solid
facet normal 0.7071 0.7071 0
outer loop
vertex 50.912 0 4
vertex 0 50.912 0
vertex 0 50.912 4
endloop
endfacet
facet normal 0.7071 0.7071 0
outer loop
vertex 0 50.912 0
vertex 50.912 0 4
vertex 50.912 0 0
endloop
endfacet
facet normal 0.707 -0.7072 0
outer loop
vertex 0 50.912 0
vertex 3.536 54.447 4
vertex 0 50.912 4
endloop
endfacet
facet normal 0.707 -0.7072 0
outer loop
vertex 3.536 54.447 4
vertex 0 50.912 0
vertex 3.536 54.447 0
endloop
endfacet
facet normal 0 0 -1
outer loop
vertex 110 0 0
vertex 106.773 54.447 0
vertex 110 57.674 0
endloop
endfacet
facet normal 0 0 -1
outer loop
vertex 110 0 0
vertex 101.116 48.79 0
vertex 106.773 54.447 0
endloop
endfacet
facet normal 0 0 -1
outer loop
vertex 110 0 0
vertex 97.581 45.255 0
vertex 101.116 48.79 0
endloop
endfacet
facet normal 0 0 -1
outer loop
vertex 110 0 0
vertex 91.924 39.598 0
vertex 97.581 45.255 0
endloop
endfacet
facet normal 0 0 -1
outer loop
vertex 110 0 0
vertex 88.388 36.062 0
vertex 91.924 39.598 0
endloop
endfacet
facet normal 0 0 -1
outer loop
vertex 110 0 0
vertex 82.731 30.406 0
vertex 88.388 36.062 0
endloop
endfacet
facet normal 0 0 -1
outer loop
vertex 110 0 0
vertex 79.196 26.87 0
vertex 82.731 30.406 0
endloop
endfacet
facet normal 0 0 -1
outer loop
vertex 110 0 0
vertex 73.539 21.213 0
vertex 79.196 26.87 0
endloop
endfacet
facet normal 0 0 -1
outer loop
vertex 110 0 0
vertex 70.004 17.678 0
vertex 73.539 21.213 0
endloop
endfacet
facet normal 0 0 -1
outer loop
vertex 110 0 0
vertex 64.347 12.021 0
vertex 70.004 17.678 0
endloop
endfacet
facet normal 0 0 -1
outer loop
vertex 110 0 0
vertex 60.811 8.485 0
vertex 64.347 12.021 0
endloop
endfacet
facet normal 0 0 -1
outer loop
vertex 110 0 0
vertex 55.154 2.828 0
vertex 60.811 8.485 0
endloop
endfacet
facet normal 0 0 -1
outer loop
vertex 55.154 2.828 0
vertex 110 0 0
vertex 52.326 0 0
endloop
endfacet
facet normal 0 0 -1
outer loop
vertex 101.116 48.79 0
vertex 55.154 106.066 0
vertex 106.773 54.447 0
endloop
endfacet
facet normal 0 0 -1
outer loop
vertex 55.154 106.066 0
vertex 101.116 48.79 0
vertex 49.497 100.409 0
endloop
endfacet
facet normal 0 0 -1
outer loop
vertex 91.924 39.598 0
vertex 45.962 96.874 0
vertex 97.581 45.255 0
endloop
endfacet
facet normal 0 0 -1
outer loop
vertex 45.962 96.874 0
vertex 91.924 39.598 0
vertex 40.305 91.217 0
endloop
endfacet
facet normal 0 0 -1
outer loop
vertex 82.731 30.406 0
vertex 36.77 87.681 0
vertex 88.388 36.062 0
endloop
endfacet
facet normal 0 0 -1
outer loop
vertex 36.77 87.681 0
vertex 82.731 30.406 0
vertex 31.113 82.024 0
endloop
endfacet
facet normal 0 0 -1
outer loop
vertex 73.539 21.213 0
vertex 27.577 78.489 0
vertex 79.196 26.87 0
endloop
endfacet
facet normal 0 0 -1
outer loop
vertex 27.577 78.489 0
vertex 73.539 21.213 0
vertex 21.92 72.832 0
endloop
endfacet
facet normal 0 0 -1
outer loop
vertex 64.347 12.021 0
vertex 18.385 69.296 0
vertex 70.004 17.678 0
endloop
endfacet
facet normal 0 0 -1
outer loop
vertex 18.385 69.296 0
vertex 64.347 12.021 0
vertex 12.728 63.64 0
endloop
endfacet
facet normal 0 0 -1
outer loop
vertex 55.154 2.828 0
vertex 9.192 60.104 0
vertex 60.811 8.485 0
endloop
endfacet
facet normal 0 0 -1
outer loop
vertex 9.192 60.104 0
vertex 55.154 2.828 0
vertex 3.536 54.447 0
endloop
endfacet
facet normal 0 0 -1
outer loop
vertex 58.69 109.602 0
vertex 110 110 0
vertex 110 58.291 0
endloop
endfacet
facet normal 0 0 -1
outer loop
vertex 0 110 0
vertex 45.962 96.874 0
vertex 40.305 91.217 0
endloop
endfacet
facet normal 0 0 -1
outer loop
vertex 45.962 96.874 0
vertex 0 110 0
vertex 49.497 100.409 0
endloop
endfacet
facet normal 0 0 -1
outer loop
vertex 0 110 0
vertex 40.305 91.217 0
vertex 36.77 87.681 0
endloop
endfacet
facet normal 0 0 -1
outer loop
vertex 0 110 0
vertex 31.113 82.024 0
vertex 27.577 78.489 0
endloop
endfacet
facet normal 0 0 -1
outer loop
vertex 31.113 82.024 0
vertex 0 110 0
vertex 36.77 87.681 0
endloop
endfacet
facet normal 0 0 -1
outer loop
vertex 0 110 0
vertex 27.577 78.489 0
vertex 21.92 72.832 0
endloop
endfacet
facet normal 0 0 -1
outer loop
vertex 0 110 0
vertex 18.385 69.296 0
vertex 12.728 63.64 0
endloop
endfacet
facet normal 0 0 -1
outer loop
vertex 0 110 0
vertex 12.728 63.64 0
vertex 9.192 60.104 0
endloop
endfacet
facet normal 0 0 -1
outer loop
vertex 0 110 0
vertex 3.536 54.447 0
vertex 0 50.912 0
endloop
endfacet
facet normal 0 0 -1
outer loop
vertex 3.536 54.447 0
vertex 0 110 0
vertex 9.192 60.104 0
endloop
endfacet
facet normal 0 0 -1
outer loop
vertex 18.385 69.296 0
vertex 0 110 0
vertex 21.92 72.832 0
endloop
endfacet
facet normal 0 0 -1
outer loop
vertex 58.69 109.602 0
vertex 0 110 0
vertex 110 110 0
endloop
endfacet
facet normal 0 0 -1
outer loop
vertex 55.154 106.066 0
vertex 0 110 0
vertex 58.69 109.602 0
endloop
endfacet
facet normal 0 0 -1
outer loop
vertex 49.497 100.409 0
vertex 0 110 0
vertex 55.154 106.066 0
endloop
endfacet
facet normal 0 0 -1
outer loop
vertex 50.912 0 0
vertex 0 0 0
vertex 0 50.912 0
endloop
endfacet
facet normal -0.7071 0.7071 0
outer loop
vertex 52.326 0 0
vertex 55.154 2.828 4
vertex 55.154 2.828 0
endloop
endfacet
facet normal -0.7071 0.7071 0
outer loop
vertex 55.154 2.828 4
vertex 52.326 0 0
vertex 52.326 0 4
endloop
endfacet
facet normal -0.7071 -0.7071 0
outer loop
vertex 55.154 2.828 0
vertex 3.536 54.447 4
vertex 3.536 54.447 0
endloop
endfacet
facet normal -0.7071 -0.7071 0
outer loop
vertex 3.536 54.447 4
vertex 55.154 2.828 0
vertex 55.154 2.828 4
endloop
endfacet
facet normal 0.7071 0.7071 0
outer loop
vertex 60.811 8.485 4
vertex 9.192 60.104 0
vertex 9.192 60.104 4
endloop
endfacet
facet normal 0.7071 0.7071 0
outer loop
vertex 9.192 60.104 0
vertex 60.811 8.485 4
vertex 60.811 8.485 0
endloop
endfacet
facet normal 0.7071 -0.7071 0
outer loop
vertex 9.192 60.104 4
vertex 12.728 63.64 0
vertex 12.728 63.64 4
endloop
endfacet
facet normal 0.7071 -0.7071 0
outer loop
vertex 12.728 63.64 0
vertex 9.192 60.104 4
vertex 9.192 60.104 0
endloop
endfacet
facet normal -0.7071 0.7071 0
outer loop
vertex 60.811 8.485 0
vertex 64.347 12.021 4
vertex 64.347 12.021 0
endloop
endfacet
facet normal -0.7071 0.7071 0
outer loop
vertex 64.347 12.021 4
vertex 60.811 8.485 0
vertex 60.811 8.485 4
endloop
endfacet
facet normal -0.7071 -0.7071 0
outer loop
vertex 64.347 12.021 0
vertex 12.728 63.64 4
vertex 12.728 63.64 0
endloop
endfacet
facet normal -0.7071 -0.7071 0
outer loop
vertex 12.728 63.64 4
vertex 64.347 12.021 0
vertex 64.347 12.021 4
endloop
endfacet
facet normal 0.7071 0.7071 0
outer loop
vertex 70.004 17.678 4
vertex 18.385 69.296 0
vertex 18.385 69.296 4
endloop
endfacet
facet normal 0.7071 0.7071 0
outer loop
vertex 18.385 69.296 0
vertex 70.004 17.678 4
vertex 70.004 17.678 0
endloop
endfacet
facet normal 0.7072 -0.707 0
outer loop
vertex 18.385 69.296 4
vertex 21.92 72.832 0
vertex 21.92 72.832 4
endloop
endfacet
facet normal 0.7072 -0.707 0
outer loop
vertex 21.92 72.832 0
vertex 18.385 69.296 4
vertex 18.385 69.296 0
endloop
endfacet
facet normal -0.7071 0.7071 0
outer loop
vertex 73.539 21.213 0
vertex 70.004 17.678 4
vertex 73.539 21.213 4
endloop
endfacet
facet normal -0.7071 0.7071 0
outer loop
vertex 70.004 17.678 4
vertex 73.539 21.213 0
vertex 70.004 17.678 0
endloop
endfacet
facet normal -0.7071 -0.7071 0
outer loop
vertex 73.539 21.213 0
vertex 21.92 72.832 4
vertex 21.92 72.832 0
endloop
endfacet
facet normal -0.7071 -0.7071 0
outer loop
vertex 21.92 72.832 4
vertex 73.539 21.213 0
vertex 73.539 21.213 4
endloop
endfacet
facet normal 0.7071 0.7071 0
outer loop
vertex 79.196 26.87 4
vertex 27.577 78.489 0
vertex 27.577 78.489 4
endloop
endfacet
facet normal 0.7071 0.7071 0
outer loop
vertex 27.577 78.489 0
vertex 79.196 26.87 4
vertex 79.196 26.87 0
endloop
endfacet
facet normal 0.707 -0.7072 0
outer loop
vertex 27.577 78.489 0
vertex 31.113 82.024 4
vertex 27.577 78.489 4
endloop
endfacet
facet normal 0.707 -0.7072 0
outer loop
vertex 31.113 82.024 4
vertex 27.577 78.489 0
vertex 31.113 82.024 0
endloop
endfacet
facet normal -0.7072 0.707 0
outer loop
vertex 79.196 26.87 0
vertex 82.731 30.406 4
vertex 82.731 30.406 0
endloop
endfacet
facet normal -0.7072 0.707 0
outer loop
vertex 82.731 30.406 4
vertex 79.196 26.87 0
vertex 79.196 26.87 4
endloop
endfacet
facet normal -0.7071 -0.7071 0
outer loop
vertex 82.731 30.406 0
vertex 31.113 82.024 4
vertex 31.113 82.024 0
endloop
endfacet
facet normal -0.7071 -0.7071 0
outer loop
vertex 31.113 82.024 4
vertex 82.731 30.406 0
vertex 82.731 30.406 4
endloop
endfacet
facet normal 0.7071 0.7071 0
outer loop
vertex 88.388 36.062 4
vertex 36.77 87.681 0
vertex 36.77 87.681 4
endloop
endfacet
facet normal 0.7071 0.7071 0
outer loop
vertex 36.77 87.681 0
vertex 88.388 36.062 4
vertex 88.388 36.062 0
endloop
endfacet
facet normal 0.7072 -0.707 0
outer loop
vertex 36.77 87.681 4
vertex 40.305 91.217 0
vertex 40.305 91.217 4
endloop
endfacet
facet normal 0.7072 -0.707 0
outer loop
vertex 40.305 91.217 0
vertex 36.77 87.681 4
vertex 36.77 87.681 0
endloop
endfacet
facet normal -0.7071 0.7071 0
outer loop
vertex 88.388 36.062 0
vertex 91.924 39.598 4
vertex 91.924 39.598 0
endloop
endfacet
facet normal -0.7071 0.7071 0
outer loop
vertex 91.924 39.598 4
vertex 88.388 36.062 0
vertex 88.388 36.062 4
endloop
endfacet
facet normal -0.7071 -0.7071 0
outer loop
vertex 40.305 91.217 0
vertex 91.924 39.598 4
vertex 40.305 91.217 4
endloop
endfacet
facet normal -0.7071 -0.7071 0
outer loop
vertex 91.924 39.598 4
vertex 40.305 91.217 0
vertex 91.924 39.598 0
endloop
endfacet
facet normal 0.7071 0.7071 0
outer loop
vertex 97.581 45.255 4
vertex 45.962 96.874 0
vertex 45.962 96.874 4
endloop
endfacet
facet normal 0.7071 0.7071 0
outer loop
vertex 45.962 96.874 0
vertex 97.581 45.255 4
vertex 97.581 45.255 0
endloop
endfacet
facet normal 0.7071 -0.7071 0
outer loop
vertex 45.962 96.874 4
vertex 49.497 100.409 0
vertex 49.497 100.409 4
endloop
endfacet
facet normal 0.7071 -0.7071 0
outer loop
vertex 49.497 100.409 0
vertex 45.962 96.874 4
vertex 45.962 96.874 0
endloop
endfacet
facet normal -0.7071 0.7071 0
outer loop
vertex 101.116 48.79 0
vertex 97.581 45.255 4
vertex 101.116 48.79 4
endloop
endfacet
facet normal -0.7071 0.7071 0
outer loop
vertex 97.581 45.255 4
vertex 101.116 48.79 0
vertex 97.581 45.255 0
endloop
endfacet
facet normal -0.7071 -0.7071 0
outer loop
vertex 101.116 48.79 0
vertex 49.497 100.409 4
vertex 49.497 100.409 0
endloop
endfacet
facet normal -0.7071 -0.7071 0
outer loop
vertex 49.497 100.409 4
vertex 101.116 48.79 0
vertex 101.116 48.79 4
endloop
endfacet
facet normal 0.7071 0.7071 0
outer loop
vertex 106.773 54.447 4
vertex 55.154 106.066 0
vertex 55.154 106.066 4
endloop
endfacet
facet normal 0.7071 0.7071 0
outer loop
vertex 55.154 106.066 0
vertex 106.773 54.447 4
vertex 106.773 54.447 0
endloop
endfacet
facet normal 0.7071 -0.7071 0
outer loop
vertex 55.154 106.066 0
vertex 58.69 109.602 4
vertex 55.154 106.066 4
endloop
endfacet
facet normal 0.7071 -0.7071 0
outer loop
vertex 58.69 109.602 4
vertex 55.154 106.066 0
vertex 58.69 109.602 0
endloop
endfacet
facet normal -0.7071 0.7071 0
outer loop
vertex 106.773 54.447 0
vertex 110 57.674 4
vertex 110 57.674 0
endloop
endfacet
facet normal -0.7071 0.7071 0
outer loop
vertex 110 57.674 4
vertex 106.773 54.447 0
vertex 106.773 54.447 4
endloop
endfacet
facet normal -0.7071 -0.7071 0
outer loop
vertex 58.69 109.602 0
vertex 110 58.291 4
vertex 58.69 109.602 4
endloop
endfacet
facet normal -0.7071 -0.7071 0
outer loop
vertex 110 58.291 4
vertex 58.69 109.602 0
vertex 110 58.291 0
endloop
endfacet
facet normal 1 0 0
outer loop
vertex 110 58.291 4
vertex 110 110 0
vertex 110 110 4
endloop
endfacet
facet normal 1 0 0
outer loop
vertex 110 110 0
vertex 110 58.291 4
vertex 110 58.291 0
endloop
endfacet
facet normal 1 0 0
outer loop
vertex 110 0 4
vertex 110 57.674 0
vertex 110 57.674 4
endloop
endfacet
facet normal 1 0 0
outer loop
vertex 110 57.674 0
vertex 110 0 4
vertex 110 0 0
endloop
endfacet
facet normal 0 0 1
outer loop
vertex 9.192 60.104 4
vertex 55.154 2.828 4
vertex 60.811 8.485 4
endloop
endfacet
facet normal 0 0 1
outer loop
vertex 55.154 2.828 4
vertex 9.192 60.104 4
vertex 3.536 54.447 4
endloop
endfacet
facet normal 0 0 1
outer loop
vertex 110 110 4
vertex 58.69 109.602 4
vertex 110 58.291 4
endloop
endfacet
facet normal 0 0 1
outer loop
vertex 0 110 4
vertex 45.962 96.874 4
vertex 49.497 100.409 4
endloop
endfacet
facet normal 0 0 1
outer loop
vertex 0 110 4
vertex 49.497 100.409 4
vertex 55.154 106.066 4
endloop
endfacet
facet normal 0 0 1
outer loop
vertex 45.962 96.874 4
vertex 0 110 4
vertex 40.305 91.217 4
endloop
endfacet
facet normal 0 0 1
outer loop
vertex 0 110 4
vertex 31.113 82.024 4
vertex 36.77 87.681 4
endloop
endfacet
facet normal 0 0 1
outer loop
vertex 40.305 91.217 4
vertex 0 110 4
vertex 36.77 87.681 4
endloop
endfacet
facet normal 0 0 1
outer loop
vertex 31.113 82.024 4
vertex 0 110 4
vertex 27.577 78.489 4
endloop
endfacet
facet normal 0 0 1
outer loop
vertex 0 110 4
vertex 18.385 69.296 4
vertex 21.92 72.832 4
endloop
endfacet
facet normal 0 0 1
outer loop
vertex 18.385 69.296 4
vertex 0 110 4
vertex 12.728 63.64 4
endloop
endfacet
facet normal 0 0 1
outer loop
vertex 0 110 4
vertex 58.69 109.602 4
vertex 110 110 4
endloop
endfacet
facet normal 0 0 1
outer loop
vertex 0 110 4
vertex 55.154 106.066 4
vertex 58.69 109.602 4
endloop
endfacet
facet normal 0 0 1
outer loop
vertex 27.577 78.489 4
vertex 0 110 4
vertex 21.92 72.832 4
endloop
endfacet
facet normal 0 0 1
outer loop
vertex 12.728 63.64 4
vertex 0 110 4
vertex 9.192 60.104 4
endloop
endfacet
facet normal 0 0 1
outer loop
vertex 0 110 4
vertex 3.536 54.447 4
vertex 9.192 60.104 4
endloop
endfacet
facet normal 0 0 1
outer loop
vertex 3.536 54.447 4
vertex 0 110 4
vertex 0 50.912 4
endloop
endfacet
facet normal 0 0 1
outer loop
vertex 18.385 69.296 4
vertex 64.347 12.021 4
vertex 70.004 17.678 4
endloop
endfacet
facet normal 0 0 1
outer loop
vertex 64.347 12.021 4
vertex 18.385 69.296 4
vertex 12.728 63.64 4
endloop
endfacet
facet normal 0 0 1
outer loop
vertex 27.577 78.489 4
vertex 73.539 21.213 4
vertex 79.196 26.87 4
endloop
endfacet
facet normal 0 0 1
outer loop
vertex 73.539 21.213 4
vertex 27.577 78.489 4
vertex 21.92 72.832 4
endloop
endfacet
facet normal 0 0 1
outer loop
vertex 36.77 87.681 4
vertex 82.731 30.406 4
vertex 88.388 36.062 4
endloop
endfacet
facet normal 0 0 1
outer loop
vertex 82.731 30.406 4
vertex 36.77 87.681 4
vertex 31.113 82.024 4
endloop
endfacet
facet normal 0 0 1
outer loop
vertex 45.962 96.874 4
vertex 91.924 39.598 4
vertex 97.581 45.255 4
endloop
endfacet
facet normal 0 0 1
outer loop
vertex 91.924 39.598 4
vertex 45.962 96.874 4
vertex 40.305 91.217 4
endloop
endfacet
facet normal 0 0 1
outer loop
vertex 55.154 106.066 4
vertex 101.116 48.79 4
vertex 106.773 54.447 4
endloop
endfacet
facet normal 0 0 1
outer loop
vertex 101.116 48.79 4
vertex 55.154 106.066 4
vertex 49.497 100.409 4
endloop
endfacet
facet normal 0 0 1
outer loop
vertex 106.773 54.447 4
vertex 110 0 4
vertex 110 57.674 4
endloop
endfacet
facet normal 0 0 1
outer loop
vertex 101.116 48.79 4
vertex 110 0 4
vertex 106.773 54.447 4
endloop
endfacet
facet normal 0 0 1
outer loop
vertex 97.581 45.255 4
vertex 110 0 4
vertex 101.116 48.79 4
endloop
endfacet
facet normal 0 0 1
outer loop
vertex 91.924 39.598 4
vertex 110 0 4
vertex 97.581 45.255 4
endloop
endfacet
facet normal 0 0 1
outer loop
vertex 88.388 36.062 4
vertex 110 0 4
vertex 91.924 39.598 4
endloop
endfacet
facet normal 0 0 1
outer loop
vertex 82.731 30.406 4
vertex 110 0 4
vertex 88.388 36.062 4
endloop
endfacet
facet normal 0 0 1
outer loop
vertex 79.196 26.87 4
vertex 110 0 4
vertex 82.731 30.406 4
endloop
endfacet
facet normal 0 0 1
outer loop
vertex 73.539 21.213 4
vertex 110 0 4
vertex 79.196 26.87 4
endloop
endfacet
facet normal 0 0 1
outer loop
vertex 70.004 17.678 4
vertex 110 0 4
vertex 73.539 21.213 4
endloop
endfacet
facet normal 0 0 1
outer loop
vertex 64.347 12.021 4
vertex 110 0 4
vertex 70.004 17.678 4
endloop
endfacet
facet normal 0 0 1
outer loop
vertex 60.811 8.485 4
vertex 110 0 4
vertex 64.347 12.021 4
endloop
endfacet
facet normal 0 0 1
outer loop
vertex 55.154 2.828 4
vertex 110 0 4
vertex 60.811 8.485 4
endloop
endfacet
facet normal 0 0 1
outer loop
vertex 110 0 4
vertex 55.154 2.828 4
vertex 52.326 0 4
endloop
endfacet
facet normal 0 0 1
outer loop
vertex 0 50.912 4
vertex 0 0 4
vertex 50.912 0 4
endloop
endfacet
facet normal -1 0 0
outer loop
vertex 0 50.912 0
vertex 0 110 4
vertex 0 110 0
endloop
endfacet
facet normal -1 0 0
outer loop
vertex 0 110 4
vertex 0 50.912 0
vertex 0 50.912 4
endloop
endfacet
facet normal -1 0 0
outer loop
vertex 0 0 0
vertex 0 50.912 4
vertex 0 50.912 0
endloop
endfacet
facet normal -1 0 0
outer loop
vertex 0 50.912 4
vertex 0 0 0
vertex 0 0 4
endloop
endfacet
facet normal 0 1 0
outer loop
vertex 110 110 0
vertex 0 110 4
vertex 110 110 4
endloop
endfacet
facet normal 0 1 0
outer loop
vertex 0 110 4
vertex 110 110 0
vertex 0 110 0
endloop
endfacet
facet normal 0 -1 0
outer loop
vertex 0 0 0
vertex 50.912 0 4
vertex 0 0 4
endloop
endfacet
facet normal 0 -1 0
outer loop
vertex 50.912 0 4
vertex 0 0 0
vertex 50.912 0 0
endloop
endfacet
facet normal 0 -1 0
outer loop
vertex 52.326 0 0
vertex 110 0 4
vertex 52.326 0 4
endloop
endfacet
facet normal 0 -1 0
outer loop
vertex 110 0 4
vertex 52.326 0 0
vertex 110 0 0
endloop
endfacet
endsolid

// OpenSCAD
w = 110;
d = 110;
h = 4;

wh = 5;
wh_gap = 8;

difference(){
cube([w, d, h])

rotate([10,10,2]);
for (i = [0:6]){
    color("red")
    rotate([0,0,45])
    translate([36 + (wh + wh_gap)*i, 0 -37])
    cube([wh, d - 37, 6]);
}
}
